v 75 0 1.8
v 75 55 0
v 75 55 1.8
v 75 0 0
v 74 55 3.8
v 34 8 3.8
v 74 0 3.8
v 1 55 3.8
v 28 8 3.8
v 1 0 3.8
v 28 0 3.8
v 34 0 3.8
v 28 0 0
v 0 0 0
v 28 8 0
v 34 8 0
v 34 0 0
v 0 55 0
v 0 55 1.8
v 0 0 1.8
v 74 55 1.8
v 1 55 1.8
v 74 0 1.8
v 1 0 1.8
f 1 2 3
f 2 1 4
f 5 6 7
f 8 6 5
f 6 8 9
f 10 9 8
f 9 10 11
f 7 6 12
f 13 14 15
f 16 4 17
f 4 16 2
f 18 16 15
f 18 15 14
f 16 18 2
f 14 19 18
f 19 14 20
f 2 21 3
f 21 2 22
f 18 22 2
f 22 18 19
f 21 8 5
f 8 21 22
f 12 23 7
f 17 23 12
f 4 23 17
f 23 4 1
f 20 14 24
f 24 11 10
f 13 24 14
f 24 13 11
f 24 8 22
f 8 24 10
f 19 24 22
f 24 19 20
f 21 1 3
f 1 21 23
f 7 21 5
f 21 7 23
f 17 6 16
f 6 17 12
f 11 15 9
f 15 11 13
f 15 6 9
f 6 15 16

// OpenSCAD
// ****************************************************************************
// Cover for the controller enclosure
// resize and add holes for LEDs as required...
// Author: Peter Holzwarth
// ****************************************************************************

// width of the controller box in mm
boxWidth= 74+4; // [20:100]

// height of the controller box in mm
boxHeight= 53+4; // [20:100]

// distance of the LED window from the front left corner, or 0 for no window
LedWindow= 28; // [0:100]

// controller cap
controllerCap([boxWidth, boxHeight], LedWindow);

module controllerCap(dimensions, LedWindow) {
    difference() {
        // outer box
        cube([dimensions[0]-3, dimensions[1]-2, 3.8]);
        // slide-in left
        translate([-0.1, -0.1, 1.8]) 
            cube([1.1, dimensions[1]-2+0.2, 2.1]);
        // slide-in right
        translate([dimensions[0]-3-1, -0.1, 1.8]) 
            cube([1.1, dimensions[1]-2+0.2, 2.1]);
        if (LedWindow) {
            // opening for LED lights
            translate([LedWindow, -0.1, -0.1]) cube([6, 8.1, 4.2]);
        }
    }
}
